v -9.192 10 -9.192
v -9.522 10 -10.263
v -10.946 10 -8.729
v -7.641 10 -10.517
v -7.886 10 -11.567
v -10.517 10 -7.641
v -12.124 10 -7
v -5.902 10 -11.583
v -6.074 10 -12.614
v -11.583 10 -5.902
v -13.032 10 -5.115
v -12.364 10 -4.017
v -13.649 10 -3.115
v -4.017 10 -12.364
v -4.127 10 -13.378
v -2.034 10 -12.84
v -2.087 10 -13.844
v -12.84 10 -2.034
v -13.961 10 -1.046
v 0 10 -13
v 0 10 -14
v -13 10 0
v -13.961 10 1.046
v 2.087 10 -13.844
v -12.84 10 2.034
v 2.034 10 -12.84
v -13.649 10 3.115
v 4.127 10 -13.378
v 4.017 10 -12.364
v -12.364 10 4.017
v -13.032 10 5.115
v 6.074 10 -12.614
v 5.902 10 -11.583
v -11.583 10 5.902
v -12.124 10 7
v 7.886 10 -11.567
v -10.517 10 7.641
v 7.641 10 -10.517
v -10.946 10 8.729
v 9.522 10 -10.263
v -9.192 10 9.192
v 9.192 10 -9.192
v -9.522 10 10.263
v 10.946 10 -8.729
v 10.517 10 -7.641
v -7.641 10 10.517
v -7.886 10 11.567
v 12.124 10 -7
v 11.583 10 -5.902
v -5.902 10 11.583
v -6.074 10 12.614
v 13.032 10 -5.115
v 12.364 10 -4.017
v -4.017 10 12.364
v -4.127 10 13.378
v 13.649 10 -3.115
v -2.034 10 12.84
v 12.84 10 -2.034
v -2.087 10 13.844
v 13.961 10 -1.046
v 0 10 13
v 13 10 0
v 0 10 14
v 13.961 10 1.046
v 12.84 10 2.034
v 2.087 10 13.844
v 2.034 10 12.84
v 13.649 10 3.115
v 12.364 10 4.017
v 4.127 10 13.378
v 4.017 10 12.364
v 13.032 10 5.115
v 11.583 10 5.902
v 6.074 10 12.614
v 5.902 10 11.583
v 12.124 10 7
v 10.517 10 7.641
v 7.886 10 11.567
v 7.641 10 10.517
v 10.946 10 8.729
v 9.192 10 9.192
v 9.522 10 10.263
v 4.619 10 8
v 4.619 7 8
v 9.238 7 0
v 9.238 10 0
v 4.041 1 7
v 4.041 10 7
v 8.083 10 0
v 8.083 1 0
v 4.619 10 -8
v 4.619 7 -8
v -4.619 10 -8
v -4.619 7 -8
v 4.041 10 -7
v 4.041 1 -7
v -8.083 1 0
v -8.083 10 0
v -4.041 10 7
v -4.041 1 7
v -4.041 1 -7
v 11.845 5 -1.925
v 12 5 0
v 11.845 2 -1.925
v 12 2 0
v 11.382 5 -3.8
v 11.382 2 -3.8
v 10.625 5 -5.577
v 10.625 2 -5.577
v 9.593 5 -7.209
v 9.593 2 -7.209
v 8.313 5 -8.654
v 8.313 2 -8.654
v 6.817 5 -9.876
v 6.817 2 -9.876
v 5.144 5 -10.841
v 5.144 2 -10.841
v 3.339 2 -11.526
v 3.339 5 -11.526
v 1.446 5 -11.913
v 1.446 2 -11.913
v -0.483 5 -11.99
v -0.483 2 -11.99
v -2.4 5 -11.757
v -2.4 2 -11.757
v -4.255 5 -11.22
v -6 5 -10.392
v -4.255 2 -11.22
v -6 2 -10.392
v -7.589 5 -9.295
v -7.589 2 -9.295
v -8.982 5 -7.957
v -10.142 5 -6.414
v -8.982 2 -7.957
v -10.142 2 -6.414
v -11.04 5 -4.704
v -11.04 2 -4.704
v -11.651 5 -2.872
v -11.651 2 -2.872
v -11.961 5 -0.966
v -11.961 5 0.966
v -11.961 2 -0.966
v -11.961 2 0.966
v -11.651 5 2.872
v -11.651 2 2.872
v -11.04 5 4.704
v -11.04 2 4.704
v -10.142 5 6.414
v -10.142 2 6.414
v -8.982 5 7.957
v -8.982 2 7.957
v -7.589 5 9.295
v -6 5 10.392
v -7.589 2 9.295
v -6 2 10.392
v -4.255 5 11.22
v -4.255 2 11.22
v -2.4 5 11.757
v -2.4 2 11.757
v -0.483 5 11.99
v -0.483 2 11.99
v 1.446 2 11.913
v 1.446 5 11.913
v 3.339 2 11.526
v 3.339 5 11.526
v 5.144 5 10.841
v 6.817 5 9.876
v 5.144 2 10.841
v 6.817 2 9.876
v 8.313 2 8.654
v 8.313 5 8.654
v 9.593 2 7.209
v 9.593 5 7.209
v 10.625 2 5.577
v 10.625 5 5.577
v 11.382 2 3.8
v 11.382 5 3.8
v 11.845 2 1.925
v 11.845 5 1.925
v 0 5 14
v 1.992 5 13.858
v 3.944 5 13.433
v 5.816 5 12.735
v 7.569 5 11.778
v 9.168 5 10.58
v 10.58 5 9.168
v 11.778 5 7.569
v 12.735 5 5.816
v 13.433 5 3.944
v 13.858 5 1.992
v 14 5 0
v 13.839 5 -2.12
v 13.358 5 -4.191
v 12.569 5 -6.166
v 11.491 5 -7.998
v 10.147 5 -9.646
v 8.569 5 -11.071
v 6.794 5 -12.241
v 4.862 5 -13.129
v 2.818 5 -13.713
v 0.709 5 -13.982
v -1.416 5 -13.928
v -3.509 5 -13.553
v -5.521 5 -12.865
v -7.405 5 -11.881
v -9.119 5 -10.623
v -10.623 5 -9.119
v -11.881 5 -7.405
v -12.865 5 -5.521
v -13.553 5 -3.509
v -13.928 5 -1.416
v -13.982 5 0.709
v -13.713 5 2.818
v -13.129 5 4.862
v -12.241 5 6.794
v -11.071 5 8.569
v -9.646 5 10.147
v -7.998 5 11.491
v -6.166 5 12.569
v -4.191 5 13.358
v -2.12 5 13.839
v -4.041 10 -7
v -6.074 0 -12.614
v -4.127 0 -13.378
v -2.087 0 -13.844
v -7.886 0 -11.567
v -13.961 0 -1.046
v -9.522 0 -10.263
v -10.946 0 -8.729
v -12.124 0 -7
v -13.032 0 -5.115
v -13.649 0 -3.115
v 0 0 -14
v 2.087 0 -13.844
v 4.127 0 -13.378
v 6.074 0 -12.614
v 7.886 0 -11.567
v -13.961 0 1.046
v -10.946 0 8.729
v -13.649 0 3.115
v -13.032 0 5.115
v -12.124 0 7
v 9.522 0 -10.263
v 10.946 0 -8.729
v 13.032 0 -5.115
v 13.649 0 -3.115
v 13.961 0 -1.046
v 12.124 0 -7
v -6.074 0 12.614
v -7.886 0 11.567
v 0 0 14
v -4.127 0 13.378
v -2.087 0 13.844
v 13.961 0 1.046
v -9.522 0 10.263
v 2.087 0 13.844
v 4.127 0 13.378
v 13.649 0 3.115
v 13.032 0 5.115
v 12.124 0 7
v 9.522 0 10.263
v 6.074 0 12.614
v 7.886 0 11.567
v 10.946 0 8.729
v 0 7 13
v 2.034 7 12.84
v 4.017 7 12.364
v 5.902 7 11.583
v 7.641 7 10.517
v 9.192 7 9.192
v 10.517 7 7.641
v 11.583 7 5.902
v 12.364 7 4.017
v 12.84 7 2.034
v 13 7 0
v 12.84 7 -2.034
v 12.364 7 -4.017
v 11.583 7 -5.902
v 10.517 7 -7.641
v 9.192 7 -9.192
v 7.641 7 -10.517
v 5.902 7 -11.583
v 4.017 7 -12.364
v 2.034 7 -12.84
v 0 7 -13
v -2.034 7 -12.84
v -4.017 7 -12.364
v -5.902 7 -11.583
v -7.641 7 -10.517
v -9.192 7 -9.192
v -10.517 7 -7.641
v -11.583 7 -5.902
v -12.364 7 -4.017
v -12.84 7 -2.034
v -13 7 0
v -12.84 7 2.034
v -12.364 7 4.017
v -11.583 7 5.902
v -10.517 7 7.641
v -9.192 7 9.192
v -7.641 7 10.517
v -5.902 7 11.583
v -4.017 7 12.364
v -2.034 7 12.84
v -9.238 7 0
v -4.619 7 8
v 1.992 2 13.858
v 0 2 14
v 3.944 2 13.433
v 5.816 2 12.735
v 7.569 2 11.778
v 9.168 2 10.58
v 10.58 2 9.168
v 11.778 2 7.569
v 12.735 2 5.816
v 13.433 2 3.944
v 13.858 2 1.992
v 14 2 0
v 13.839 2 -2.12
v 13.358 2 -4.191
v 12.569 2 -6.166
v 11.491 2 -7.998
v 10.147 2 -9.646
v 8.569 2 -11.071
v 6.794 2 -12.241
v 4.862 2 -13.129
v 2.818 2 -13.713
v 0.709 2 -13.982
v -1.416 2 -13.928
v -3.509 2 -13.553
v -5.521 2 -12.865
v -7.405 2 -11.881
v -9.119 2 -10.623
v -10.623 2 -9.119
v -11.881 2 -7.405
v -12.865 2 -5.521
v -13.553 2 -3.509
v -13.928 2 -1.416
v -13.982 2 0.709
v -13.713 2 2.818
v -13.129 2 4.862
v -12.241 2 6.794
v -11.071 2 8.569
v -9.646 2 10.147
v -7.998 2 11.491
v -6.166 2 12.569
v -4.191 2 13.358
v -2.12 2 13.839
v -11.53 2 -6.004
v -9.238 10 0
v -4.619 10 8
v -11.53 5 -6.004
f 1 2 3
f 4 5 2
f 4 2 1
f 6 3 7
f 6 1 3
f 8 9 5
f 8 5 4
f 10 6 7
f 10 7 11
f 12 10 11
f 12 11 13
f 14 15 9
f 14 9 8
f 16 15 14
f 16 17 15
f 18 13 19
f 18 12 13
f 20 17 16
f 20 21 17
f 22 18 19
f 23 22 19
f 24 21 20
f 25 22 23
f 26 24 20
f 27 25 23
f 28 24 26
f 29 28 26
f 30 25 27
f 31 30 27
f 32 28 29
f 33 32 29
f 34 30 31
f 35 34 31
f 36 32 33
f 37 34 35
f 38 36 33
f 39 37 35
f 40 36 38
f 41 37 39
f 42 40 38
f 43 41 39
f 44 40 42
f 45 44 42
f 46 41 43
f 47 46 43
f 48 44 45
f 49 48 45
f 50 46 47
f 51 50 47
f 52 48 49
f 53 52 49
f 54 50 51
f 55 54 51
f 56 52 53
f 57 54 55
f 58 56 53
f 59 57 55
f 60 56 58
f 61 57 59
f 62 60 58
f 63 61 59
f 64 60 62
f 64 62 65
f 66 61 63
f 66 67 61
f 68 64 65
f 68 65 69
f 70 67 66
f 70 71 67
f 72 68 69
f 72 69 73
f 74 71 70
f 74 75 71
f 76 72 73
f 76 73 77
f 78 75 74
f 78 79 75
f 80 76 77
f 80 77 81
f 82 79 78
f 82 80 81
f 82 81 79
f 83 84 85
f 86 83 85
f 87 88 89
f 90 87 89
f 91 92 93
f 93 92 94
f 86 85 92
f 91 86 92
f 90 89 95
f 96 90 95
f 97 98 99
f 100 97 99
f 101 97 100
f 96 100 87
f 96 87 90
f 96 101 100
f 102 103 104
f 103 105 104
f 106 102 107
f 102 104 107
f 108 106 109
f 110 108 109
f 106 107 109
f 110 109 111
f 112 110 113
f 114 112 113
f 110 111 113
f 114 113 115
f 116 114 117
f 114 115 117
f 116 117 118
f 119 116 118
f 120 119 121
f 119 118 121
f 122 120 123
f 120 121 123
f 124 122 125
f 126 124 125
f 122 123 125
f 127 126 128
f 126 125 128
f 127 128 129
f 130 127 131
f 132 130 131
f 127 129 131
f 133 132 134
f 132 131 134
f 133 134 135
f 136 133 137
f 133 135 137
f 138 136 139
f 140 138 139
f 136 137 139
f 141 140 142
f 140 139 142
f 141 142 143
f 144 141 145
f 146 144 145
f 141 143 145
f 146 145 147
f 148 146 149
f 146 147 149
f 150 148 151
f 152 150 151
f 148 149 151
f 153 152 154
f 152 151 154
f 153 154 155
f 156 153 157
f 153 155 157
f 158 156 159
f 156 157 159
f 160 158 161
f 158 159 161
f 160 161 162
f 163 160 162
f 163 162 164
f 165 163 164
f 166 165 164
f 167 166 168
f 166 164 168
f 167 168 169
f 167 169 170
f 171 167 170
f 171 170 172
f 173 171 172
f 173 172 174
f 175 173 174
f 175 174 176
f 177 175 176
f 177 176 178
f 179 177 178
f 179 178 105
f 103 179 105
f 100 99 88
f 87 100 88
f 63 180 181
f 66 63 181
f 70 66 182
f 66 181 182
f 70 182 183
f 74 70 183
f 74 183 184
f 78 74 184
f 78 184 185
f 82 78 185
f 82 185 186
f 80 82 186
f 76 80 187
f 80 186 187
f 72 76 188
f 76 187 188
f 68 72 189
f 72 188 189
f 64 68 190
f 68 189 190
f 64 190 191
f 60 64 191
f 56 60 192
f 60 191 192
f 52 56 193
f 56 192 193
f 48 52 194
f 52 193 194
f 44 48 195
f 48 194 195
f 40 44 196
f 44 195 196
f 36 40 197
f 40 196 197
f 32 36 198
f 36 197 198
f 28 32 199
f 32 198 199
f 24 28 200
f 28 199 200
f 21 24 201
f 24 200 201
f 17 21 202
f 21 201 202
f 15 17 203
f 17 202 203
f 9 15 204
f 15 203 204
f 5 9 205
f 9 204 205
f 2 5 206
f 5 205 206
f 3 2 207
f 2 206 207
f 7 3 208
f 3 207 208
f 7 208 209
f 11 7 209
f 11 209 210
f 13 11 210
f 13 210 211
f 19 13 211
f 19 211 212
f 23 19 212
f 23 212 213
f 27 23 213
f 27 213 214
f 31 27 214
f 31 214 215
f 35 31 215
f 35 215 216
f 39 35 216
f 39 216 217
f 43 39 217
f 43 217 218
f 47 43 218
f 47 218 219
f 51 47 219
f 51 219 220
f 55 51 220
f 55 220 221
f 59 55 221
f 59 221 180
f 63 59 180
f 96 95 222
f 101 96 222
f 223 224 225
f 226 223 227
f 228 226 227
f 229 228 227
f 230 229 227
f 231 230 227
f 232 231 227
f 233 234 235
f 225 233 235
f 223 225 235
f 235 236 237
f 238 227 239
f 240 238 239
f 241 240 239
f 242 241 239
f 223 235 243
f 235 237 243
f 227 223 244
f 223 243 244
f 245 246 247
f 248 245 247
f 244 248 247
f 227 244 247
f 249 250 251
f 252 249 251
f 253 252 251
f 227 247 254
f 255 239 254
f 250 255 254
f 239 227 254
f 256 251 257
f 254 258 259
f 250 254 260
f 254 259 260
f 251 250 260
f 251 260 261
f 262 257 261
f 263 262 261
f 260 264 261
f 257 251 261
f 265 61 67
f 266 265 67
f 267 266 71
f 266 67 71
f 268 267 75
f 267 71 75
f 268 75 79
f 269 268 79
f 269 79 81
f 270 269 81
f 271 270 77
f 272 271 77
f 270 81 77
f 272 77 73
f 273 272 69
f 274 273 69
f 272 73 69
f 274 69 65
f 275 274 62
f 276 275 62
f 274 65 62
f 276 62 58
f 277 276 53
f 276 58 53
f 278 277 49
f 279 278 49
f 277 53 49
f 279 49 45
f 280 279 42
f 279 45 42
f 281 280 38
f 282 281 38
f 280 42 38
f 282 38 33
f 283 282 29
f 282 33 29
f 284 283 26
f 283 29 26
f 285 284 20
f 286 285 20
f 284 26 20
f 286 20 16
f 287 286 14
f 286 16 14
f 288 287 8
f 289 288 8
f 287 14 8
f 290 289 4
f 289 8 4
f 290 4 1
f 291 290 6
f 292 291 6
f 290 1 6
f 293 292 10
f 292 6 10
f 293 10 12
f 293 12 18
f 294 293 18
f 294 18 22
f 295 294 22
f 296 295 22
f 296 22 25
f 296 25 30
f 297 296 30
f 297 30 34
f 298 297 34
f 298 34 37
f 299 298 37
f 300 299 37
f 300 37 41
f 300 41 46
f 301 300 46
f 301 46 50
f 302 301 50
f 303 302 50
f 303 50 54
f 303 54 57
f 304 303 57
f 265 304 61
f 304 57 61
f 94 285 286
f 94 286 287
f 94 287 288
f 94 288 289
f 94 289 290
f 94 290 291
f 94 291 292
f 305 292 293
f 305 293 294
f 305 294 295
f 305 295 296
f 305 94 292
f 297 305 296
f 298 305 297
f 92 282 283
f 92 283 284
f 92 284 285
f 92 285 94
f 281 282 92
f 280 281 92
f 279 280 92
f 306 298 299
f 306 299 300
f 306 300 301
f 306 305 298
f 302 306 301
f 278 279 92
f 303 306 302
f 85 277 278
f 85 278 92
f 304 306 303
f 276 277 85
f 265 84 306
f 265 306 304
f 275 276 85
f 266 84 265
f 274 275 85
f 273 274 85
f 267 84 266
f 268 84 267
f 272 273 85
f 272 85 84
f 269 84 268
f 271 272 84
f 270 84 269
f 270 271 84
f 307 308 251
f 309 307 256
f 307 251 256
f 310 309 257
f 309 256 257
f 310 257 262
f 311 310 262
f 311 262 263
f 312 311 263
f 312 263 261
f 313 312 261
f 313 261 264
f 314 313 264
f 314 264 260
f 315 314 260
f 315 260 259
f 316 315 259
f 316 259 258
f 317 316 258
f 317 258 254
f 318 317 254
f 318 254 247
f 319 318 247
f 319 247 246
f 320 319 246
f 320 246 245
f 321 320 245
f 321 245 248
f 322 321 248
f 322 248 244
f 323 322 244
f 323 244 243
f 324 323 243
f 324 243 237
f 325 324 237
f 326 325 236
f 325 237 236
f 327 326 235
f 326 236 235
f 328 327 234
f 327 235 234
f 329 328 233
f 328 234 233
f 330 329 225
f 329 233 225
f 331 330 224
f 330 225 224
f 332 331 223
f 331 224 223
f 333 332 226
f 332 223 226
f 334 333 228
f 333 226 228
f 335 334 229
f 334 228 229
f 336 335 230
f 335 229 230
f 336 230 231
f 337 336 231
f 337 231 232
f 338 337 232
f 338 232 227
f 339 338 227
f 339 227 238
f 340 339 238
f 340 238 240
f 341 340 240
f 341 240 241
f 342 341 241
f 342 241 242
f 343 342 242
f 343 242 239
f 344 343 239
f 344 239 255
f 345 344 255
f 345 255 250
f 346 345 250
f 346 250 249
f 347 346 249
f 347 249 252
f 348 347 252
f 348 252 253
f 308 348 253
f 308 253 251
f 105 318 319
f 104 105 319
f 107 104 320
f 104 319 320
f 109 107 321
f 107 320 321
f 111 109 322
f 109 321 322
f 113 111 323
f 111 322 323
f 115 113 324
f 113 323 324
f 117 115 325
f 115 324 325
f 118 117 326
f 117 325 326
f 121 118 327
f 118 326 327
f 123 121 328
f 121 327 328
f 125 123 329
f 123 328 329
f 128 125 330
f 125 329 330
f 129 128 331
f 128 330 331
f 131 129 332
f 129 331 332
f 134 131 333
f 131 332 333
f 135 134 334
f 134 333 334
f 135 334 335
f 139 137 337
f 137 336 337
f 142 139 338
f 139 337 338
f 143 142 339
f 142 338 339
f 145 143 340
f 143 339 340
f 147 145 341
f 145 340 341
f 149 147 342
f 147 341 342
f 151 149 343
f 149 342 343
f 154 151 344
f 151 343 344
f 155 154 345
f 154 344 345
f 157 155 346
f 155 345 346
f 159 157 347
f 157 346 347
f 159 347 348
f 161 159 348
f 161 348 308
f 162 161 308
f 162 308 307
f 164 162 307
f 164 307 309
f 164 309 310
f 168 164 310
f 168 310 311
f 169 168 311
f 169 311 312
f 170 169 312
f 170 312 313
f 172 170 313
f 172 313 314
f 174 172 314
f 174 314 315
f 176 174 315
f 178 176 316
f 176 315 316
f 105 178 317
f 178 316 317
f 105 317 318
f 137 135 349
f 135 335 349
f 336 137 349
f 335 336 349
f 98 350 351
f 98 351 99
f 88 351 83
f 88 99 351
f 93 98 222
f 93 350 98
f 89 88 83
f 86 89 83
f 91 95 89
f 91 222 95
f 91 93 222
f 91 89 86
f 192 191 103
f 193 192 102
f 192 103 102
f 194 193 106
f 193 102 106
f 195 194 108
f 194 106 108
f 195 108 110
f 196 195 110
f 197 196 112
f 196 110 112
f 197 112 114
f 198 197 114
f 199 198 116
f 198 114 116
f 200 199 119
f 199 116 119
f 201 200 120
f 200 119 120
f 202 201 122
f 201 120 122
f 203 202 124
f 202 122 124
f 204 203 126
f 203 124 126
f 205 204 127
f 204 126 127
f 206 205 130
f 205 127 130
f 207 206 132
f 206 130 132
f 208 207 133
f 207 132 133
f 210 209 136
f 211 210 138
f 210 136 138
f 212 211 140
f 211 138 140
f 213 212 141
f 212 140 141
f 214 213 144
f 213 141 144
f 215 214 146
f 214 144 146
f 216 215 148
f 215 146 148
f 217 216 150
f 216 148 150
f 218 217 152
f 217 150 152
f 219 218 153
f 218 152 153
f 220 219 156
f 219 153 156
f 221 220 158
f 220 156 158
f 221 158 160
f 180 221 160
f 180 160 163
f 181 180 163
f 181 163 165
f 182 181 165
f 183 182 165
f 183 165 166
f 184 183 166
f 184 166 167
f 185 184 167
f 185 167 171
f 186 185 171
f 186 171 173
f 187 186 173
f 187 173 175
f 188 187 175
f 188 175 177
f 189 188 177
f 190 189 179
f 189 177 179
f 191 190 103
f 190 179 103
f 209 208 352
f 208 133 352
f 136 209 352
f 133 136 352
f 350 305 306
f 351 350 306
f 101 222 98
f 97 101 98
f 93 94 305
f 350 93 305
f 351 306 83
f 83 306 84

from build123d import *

# Parameters (mm, degrees)
SKETCH1_R           = 14
BOSS_EXTRUDE1_DEPTH = 10
SKETCH2_R           = 13
CUT_EXTRUDE1_DEPTH  = 3
BOSS_EXTRUDE2_DEPTH = 3
CUT_EXTRUDE2_DEPTH  = 9
SKETCH5_W           = 2
SKETCH5_H           = 3


with BuildPart() as part:
    # Sketch1 → Boss-Extrude1 (new body)
    with BuildSketch(Plane(origin=(0, 0, 0), x_dir=(1, 0, 0), z_dir=(0, 1, 0))):
        with Locations(Location((0, 0, 0), (0, 0, 270))):
            Circle(SKETCH1_R)
    extrude(amount=BOSS_EXTRUDE1_DEPTH)

    # Sketch2 → Cut-Extrude1 (cut)
    with BuildSketch(Plane(origin=(0, 10, 0), x_dir=(1, 0, 0), z_dir=(0, 1, 0))):
        with Locations(Location((0, 0, 0), (0, 0, 270))):
            Circle(SKETCH2_R)
    extrude(amount=-CUT_EXTRUDE1_DEPTH, mode=Mode.SUBTRACT)

    # Sketch3 → Boss-Extrude2 (add)
    with BuildSketch(Plane(origin=(0, 7, 0), x_dir=(1, 0, 0), z_dir=(0, 1, 0))):
        Polygon((9.237604307, 0), (4.618802154, 8), (-4.618802154, 8), (-9.237604307, 0), (-4.618802154, -8), (4.618802154, -8), align=None)
    extrude(amount=BOSS_EXTRUDE2_DEPTH)

    # Sketch4 → Cut-Extrude2 (cut)
    with BuildSketch(Plane(origin=(0, 10, 0), x_dir=(1, 0, 0), z_dir=(0, 1, 0))):
        Polygon((8.082903769, 0), (4.041451884, 7), (-4.041451884, 7), (-8.082903769, 0), (-4.041451884, -7), (4.041451884, -7), align=None)
    extrude(amount=-CUT_EXTRUDE2_DEPTH, mode=Mode.SUBTRACT)

    # Cut-Sweep1: sweep along a path in Sketch6
    with BuildLine(Plane(origin=(0, 3.5, 0), x_dir=(1, 0, 0), z_dir=(0, 1, 0))) as cut_sweep1_path:
        CenterArc((0, 0), 13, 0, 360)
    # Sketch5 → Cut-Sweep1 (sweep, cut)
    with BuildSketch(Plane.XY):
        with Locations((13, 3.5)):
            Rectangle(SKETCH5_W, SKETCH5_H)
    sweep(path=cut_sweep1_path.line, mode=Mode.SUBTRACT)


solid = part.part
